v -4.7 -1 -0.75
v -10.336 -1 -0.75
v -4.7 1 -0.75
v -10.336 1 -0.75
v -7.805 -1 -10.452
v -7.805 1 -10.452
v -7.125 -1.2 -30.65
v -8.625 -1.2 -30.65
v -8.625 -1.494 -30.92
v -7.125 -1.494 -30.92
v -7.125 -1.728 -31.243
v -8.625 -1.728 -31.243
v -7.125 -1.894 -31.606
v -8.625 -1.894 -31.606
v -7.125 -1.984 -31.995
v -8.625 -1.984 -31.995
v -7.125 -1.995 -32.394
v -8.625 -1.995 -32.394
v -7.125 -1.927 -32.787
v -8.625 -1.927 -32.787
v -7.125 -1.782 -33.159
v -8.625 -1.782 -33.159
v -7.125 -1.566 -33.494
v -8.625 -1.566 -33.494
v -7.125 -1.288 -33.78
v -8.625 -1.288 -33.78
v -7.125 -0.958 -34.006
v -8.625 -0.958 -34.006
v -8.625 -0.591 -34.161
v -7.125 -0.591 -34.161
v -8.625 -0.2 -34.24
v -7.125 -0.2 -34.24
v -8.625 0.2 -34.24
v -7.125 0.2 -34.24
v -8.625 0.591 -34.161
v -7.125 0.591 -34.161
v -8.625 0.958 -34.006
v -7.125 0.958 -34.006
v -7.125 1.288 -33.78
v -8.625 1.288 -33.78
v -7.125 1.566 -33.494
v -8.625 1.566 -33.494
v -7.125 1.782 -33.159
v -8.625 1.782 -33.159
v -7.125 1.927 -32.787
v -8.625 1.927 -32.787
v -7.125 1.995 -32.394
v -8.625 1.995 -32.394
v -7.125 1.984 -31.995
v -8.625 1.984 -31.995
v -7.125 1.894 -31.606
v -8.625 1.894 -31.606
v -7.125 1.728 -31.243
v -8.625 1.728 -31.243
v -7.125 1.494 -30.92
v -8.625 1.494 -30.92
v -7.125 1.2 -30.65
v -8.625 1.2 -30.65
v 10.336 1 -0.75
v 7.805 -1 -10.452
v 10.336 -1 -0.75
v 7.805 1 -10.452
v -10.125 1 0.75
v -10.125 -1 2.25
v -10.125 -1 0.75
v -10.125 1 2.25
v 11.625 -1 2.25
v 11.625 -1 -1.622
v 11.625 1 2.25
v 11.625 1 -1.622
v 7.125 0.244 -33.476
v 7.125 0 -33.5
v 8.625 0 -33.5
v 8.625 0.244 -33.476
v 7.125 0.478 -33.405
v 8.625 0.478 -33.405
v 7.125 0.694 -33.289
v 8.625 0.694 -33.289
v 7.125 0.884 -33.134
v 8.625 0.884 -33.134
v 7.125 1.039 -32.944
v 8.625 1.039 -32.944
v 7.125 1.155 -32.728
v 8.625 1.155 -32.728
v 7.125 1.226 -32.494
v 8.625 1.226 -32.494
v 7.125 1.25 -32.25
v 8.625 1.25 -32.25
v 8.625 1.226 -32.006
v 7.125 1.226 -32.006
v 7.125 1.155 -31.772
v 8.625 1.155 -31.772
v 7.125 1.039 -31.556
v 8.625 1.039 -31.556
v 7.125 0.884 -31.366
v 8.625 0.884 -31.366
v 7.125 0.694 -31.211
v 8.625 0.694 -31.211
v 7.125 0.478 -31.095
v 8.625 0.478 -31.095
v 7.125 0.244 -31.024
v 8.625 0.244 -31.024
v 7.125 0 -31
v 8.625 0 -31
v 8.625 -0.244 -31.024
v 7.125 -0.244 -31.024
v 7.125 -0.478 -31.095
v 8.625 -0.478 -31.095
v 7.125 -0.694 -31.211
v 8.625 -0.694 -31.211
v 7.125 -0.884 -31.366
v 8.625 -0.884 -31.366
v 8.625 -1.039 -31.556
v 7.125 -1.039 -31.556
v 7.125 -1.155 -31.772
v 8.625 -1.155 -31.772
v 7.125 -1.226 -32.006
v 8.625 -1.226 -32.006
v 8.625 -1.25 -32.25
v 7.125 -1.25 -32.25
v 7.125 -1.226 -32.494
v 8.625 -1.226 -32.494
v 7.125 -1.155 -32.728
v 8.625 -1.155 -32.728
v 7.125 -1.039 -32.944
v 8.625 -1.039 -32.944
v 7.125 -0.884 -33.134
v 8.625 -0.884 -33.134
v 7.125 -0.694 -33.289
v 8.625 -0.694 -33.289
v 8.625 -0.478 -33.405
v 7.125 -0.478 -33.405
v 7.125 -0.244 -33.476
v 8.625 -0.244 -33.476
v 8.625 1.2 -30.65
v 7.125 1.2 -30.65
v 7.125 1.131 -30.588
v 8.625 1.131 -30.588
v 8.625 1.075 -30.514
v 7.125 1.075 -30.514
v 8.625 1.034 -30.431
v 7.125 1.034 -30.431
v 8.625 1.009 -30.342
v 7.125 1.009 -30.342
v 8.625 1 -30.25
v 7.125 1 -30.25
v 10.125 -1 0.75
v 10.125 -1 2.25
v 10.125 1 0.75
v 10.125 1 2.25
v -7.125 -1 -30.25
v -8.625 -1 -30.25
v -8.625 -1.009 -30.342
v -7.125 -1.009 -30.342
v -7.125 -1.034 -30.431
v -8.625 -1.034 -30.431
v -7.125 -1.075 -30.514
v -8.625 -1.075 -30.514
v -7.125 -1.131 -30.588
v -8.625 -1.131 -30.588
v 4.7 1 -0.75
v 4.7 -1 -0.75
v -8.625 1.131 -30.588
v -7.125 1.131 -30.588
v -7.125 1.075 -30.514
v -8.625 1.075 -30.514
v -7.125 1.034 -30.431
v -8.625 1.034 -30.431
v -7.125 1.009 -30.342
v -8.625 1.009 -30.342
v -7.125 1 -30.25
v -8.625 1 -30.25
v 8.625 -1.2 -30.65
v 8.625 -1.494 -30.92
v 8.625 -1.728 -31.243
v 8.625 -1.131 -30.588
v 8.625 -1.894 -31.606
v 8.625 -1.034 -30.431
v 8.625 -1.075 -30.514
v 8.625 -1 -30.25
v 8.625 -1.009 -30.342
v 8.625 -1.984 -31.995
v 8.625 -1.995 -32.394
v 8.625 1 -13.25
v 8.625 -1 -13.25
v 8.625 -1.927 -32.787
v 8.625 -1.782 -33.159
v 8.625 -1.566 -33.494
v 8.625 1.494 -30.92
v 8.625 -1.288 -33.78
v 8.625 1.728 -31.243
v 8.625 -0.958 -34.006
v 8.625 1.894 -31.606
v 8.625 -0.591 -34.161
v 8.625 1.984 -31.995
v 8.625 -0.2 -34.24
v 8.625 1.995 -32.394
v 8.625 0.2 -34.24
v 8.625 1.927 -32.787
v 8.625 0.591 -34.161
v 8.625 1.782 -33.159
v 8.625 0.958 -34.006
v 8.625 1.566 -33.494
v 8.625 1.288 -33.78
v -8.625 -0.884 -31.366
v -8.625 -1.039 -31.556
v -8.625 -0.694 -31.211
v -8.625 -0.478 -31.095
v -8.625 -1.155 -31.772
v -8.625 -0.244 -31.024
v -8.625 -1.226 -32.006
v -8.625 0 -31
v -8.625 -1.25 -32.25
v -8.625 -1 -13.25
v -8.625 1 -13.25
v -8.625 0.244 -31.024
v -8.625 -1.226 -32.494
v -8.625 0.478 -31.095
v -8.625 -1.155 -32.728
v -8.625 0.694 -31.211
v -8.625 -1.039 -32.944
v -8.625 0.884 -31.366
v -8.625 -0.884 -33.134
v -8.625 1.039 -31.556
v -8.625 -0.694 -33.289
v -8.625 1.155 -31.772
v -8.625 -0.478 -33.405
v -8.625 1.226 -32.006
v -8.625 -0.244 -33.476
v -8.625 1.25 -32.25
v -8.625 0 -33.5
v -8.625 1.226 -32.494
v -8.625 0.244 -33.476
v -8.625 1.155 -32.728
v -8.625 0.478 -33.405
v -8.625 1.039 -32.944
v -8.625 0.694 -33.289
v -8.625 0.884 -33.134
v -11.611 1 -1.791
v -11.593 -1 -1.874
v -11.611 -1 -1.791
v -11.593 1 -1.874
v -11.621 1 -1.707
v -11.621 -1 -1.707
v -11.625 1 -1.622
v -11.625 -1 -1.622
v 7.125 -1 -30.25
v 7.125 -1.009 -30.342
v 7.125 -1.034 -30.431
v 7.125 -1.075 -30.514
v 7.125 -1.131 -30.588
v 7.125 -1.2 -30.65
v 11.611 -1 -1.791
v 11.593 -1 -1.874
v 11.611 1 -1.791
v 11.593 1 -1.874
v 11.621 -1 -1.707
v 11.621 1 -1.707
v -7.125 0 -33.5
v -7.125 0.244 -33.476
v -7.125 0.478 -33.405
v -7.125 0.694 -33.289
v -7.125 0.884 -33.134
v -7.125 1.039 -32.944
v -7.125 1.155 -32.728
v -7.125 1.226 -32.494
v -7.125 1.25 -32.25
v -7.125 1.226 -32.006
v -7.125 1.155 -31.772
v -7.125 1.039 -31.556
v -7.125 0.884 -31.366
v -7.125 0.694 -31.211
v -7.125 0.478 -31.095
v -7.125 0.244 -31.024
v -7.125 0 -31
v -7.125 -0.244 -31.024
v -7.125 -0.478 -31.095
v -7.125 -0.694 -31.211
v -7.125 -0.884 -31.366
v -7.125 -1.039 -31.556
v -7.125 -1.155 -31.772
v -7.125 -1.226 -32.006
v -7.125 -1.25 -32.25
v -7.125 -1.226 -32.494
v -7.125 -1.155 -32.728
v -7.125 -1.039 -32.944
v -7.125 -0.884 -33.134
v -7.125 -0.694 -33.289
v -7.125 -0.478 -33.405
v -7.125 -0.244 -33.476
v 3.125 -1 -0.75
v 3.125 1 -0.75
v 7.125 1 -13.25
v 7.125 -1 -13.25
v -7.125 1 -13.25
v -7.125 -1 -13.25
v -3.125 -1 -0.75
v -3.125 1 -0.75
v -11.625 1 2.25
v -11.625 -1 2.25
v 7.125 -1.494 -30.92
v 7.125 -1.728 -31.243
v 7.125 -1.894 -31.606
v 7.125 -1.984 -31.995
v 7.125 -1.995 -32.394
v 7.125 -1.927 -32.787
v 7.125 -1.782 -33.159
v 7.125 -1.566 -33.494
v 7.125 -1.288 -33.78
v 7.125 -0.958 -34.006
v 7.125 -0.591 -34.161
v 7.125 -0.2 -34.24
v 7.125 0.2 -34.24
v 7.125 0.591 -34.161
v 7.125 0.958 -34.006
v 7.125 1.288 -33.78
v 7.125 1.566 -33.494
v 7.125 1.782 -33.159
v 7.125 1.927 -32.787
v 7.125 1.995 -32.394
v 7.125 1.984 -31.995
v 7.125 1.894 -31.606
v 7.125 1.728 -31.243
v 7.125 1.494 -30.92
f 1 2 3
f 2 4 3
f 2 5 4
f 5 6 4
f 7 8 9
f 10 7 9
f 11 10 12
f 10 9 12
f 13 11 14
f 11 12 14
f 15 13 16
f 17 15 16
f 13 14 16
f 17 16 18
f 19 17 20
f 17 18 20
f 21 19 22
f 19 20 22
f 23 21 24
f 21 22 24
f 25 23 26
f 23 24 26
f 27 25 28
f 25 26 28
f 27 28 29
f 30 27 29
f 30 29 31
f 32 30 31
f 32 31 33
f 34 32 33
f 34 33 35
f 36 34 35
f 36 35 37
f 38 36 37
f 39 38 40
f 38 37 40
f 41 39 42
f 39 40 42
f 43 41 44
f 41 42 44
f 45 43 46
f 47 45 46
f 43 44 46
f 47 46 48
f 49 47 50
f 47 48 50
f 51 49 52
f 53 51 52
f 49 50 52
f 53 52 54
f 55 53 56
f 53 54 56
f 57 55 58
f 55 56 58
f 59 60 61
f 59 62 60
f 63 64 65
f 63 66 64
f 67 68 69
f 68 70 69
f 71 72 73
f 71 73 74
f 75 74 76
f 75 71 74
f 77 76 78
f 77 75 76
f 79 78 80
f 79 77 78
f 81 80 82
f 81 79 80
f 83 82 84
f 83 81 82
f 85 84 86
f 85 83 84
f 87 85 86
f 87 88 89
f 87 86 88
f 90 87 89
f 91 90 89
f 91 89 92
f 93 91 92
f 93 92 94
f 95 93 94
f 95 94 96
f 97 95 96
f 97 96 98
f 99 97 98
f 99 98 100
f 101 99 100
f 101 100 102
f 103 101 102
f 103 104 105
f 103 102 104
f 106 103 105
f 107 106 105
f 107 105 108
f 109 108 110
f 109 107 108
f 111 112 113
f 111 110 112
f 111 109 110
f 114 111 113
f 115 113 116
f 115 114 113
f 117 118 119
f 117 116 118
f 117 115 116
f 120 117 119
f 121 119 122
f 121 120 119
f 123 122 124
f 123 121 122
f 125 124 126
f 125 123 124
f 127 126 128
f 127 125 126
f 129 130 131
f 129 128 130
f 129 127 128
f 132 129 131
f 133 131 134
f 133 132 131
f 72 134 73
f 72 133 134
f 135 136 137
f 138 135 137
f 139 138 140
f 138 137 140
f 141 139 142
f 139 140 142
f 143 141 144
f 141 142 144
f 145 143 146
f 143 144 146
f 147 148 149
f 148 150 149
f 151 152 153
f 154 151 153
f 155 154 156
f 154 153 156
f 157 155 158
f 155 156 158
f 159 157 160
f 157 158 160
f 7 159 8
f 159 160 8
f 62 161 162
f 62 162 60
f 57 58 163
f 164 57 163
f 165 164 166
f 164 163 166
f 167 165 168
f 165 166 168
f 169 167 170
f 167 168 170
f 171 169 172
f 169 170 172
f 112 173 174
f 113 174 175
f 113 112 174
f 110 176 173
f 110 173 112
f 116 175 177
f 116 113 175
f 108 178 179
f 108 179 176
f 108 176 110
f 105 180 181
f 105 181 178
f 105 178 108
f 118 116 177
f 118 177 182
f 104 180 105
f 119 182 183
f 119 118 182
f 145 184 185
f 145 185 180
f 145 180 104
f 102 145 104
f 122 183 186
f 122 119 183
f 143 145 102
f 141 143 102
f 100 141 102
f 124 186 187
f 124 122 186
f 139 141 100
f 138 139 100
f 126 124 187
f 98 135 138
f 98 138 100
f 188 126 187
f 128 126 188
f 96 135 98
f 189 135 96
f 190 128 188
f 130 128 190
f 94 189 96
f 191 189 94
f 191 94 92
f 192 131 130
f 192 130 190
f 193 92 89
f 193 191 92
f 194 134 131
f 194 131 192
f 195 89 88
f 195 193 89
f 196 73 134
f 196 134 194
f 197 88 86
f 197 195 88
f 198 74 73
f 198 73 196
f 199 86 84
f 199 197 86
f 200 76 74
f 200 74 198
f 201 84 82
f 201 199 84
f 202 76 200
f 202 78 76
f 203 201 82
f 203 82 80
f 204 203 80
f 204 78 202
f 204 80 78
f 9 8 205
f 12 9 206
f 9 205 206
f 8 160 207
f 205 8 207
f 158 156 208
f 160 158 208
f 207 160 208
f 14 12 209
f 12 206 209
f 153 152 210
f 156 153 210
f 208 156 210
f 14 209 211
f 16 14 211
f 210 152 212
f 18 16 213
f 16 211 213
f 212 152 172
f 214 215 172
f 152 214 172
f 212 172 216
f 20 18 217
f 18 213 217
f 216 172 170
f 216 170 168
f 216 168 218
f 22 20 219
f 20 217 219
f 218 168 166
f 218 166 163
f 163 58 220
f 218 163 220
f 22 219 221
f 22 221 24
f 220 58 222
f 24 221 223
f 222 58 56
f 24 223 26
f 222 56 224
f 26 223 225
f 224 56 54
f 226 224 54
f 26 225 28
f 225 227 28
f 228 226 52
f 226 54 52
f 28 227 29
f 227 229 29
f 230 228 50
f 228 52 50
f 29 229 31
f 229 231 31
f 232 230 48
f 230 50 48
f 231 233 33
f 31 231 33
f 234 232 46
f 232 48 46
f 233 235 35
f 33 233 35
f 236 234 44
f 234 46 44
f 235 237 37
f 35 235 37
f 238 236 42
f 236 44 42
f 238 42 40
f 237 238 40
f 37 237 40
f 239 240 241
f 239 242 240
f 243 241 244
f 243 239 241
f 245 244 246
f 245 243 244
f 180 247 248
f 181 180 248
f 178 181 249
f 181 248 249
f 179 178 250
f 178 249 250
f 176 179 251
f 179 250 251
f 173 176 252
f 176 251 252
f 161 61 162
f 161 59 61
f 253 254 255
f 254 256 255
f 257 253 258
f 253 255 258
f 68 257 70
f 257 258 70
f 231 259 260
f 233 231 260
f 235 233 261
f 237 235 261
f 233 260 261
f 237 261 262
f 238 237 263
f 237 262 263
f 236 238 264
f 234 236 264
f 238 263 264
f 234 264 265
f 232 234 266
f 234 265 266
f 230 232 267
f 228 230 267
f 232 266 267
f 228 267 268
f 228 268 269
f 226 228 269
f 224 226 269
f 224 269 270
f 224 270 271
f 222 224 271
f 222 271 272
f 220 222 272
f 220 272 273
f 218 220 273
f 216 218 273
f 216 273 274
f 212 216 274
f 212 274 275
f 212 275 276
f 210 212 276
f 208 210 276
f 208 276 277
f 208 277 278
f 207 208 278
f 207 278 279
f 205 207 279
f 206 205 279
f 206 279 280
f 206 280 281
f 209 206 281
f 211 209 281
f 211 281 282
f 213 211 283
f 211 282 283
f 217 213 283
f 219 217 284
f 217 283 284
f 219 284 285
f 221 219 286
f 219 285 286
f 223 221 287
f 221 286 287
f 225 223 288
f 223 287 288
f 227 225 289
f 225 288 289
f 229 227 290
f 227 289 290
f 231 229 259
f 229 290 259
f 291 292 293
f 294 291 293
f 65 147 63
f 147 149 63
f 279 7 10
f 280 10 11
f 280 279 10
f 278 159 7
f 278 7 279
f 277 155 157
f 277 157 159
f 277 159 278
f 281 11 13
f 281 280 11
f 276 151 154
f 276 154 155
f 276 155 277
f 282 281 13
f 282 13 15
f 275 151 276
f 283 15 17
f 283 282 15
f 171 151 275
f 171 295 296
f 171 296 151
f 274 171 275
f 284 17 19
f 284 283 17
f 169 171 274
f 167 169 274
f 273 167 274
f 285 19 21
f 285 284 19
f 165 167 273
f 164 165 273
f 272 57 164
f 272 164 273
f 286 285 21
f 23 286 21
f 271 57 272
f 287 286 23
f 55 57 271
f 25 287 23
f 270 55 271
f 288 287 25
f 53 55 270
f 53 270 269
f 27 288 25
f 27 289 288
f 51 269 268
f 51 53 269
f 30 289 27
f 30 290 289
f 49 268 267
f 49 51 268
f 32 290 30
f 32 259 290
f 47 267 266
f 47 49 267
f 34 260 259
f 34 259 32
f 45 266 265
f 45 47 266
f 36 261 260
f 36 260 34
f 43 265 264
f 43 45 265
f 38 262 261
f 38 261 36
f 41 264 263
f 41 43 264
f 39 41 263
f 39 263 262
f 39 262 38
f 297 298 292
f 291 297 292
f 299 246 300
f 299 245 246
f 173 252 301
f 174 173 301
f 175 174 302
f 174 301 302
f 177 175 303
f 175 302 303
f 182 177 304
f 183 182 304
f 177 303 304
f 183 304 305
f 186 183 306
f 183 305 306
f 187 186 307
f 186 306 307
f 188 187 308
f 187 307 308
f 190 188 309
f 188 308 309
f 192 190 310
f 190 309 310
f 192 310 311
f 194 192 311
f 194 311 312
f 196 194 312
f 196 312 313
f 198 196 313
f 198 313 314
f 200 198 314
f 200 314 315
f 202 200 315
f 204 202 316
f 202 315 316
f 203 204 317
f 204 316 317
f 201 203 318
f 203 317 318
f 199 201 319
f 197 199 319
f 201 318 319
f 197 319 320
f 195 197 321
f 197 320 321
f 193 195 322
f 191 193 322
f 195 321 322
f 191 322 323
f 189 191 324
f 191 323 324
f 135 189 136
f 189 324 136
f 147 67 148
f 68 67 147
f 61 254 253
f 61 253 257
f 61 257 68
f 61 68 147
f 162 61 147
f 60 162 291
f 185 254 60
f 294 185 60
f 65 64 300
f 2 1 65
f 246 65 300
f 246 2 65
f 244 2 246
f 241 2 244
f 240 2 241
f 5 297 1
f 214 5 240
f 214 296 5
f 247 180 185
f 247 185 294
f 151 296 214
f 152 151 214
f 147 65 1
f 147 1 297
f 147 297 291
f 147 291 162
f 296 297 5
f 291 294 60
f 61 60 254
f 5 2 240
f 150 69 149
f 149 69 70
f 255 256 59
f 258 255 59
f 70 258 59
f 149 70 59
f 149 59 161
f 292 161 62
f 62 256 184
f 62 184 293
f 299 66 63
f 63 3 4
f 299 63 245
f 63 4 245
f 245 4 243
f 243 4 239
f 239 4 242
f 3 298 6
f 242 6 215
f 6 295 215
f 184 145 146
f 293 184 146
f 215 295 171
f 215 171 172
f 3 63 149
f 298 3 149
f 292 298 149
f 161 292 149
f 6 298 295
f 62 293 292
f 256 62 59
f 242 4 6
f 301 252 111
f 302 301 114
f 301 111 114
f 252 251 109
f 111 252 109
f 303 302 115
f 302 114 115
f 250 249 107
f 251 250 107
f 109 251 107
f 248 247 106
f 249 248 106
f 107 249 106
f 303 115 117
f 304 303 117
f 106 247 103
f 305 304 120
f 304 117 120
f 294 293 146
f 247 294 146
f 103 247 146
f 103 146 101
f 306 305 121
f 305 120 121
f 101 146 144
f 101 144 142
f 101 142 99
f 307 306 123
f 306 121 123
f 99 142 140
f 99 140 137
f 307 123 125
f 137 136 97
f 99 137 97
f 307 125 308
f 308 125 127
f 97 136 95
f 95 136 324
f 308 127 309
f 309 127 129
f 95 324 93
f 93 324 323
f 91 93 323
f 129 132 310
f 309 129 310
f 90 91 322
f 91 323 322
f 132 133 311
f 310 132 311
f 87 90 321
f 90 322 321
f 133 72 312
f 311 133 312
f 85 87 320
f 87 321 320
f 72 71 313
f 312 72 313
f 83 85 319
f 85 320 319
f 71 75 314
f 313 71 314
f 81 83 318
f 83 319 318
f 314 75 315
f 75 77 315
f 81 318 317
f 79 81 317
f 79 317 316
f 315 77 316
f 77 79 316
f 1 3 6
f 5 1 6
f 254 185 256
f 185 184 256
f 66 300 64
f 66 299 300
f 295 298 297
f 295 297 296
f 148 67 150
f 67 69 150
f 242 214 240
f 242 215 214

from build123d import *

# Parameters (mm, degrees)
BOSS_EXTRUDE1_DEPTH     = 1
BOSS_EXTRUDE2_START     = 7.125
BOSS_EXTRUDE2_DEPTH     = 1.5
BOSS_EXTRUDE3_START     = -8.625
BOSS_EXTRUDE3_DEPTH     = 1.5
SKETCH3_R               = 1.25
CUT_EXTRUDE1_DEPTH      = 12.625
CUT_EXTRUDE1_DEPTH_BACK = 12.625


with BuildPart() as part:
    # Sketch1 → Boss-Extrude1 (new body, symmetric)
    with BuildSketch(Plane(origin=(0, 0, 0), x_dir=(1, 0, 0), z_dir=(0, 1, 0))):
        with BuildLine():
            Line((-10.125, -0.75), (0, -0.75))
            Line((0, -0.75), (0, 0.75))
            Line((0, 0.75), (-3.125, 0.75))
            Line((-3.125, 0.75), (-7.125, 13.25))
            Line((-7.125, 13.25), (-7.125, 30.25))
            Line((-7.125, 30.25), (-8.625, 30.25))
            Line((-8.625, 30.25), (-8.625, 13.25))
            Line((-8.625, 13.25), (-11.592617272, 1.874133789))
            ThreePointArc((-11.592617272, 1.874133789), (-11.61687128, 1.748957182), (-11.625, 1.621711892))
            Line((-11.625, 1.621711892), (-11.625, -0.75))
            Line((-11.625, -0.75), (-11.625, -2.25))
            Line((-11.625, -2.25), (-10.125, -2.25))
            Line((-10.125, -2.25), (-10.125, -0.75))
        make_face()
        Polygon((-4.69992857, 0.75), (-7.804648328, 10.452249246), (-10.335669871, 0.75), align=None, mode=Mode.SUBTRACT)
    boss_extrude1 = extrude(amount=BOSS_EXTRUDE1_DEPTH, both=True)

    # Mirror1: Boss-Extrude1 across plane
    add(boss_extrude1.mirror(Plane(origin=(0, 0, 0), x_dir=(0, 0, 1), z_dir=(1, 0, 0))))

    # Sketch2 → Boss-Extrude2 (add)
    with BuildSketch(Plane(origin=(0, 0, 0), x_dir=(0, 0, -1), z_dir=(1, 0, 0)).offset(BOSS_EXTRUDE2_START)):
        with BuildLine():
            Line((30.25, 1), (30.25, -1))
            ThreePointArc((30.25, -1), (30.473606798, -1.052786405), (30.65, -1.2))
            ThreePointArc((30.65, -1.2), (34.25, 0), (30.65, 1.2))
            ThreePointArc((30.65, 1.2), (30.473606798, 1.052786405), (30.25, 1))
        make_face()
    extrude(amount=BOSS_EXTRUDE2_DEPTH)

    # Sketch2<2> → Boss-Extrude3 (add)
    with BuildSketch(Plane(origin=(0, 0, 0), x_dir=(0, 0, -1), z_dir=(1, 0, 0)).offset(BOSS_EXTRUDE3_START)):
        with BuildLine():
            Line((30.25, 1), (30.25, -1))
            ThreePointArc((30.25, -1), (30.473606798, -1.052786405), (30.65, -1.2))
            ThreePointArc((30.65, -1.2), (34.25, 0), (30.65, 1.2))
            ThreePointArc((30.65, 1.2), (30.473606798, 1.052786405), (30.25, 1))
        make_face()
    extrude(amount=BOSS_EXTRUDE3_DEPTH)

    # Sketch3 → Cut-Extrude1 (cut, two sides)
    with BuildSketch(Plane(origin=(0, 0, 0), x_dir=(0, 0, -1), z_dir=(1, 0, 0))) as cut_extrude1_sk:
        with Locations((32.25, 0)):
            Circle(SKETCH3_R)
    extrude(amount=CUT_EXTRUDE1_DEPTH, mode=Mode.SUBTRACT)
    extrude(cut_extrude1_sk.sketch, amount=-CUT_EXTRUDE1_DEPTH_BACK, mode=Mode.SUBTRACT)


solid = part.part
